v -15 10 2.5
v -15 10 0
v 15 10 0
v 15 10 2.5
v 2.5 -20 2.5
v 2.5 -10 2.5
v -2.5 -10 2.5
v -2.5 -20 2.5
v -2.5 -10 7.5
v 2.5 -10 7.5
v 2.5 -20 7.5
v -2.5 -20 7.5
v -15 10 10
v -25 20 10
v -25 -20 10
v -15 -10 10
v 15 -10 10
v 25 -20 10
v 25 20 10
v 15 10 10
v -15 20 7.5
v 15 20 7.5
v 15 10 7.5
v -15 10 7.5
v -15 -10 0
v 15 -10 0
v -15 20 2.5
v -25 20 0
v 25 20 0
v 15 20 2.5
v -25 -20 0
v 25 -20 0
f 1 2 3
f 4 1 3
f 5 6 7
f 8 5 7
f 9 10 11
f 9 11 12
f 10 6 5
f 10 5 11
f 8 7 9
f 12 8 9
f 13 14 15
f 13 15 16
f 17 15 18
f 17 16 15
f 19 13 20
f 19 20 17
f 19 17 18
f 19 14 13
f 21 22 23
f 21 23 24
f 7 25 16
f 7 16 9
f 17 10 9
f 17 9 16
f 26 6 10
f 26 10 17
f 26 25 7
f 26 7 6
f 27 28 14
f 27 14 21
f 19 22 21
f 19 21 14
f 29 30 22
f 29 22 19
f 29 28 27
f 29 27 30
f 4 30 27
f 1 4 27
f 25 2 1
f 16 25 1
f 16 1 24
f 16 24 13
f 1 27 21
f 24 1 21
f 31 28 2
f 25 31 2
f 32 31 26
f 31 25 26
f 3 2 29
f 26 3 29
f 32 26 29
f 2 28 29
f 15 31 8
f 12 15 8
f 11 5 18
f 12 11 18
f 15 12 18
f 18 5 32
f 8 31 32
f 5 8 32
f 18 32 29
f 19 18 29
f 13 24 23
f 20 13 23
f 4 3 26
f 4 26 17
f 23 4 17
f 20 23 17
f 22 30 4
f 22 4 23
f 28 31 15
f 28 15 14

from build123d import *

# Parameters (mm, degrees)
F0_W     = 50
F0_H     = 40
F0_W_2   = 30
F0_H_2   = 20
F1_DEPTH = 10
F2_W     = 30
F2_H     = 5
F3_DEPTH = 25
F4_W     = 5
F4_H     = 5
F5_DEPTH = 10


with BuildPart() as f1:
    # F0 (on Top) → F1 (new body)
    with BuildSketch(Plane.XY):
        Rectangle(F0_W, F0_H)
        Rectangle(F0_W_2, F0_H_2, mode=Mode.SUBTRACT)
    extrude(amount=F1_DEPTH)

    # F2 (on face) → F3 (cut)
    with BuildSketch(Plane(origin=(0, 20, 0), x_dir=(-1, 0, 0), z_dir=(0, 1, 0))):
        with Locations((0, 5)):
            Rectangle(F2_W, F2_H)
    extrude(amount=-F3_DEPTH, mode=Mode.SUBTRACT)

    # F4 (on face) → F5 (cut, through all)
    with BuildSketch(Plane(origin=(0, -10, 0), x_dir=(-1, 0, 0), z_dir=(0, 1, 0))):
        with Locations((0, 5)):
            Rectangle(F4_W, F4_H)
    extrude(amount=-F5_DEPTH, mode=Mode.SUBTRACT)


solid = f1.part
